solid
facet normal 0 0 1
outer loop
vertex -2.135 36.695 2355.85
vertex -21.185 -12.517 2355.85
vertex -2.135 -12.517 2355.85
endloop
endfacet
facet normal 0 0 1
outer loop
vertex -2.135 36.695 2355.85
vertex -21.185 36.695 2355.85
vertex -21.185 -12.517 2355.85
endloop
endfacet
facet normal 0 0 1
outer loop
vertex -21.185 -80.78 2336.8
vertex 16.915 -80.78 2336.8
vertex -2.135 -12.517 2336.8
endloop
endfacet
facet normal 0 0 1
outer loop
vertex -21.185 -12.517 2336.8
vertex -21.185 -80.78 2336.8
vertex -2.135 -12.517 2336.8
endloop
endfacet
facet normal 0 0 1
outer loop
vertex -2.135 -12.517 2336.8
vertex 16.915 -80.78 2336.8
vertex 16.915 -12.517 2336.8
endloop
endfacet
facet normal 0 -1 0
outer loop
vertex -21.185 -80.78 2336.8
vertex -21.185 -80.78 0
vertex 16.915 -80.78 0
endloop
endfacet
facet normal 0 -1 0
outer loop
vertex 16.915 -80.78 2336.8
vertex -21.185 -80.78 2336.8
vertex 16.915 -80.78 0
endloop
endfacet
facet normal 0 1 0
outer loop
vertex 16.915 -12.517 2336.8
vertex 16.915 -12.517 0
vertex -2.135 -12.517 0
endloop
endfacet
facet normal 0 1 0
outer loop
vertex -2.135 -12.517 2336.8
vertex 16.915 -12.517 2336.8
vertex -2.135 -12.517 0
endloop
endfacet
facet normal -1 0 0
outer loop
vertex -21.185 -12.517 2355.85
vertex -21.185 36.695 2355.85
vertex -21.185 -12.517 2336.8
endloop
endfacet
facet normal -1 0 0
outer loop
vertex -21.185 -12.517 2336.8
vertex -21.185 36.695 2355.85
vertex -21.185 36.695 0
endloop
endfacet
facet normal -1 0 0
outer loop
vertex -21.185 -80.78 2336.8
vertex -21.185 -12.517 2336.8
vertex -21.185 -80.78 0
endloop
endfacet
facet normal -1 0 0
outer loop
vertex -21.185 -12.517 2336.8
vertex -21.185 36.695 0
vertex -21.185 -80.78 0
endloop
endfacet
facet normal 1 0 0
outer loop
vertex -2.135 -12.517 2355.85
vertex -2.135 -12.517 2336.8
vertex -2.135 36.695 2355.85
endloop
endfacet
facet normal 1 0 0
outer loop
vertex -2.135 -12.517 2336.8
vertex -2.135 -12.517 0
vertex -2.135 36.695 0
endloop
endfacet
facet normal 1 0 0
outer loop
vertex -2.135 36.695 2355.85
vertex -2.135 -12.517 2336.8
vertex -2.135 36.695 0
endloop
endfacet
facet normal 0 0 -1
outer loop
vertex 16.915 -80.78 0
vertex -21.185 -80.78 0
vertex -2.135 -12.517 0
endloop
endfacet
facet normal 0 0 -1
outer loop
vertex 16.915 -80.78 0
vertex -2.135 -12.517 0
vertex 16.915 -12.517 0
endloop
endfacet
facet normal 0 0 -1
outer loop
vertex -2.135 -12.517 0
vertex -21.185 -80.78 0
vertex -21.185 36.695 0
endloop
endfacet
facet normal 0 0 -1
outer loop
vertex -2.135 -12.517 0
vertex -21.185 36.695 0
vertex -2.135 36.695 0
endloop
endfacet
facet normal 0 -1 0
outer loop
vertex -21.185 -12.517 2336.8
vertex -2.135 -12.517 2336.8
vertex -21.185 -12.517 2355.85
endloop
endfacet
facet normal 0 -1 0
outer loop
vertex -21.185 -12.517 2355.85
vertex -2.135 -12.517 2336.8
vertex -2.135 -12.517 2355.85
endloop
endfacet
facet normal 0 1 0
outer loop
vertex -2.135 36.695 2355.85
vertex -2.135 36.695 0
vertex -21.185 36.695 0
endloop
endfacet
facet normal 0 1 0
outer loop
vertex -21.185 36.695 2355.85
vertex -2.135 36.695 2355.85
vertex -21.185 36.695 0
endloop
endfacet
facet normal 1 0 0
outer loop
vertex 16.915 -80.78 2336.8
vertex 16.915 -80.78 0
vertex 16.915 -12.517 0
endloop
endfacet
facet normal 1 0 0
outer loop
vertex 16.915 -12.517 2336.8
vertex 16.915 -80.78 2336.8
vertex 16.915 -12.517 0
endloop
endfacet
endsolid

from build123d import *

# Parameters (mm, degrees)
F1_DEPTH      = 2355.85
F2_W          = 68.2625
F2_H          = 19.05
F3_DEPTH      = 21.1863303725
F3_DEPTH_BACK = 16.9156696275


with BuildPart() as f1:
    # F0 (on Top) → F1 (new body)
    with BuildSketch(Plane.XY):
        Polygon((-2.1353303725, -12.5172607846), (-2.1353303725, 36.6952392154), (-21.1853303725, 36.6952392154), (-21.1853303725, -80.7797607846), (16.9146696275, -80.7797607846), (16.9146696275, -12.5172607846), align=None)
    extrude(amount=F1_DEPTH)

    # F2 (on Right) → F3 (cut, two sides)
    with BuildSketch(Plane.YZ) as f3_sk:
        with Locations((-46.6485107846, 2346.325)):
            Rectangle(F2_W, F2_H)
    extrude(amount=-F3_DEPTH, mode=Mode.SUBTRACT)
    extrude(f3_sk.sketch, amount=F3_DEPTH_BACK, mode=Mode.SUBTRACT)


solid = f1.part
